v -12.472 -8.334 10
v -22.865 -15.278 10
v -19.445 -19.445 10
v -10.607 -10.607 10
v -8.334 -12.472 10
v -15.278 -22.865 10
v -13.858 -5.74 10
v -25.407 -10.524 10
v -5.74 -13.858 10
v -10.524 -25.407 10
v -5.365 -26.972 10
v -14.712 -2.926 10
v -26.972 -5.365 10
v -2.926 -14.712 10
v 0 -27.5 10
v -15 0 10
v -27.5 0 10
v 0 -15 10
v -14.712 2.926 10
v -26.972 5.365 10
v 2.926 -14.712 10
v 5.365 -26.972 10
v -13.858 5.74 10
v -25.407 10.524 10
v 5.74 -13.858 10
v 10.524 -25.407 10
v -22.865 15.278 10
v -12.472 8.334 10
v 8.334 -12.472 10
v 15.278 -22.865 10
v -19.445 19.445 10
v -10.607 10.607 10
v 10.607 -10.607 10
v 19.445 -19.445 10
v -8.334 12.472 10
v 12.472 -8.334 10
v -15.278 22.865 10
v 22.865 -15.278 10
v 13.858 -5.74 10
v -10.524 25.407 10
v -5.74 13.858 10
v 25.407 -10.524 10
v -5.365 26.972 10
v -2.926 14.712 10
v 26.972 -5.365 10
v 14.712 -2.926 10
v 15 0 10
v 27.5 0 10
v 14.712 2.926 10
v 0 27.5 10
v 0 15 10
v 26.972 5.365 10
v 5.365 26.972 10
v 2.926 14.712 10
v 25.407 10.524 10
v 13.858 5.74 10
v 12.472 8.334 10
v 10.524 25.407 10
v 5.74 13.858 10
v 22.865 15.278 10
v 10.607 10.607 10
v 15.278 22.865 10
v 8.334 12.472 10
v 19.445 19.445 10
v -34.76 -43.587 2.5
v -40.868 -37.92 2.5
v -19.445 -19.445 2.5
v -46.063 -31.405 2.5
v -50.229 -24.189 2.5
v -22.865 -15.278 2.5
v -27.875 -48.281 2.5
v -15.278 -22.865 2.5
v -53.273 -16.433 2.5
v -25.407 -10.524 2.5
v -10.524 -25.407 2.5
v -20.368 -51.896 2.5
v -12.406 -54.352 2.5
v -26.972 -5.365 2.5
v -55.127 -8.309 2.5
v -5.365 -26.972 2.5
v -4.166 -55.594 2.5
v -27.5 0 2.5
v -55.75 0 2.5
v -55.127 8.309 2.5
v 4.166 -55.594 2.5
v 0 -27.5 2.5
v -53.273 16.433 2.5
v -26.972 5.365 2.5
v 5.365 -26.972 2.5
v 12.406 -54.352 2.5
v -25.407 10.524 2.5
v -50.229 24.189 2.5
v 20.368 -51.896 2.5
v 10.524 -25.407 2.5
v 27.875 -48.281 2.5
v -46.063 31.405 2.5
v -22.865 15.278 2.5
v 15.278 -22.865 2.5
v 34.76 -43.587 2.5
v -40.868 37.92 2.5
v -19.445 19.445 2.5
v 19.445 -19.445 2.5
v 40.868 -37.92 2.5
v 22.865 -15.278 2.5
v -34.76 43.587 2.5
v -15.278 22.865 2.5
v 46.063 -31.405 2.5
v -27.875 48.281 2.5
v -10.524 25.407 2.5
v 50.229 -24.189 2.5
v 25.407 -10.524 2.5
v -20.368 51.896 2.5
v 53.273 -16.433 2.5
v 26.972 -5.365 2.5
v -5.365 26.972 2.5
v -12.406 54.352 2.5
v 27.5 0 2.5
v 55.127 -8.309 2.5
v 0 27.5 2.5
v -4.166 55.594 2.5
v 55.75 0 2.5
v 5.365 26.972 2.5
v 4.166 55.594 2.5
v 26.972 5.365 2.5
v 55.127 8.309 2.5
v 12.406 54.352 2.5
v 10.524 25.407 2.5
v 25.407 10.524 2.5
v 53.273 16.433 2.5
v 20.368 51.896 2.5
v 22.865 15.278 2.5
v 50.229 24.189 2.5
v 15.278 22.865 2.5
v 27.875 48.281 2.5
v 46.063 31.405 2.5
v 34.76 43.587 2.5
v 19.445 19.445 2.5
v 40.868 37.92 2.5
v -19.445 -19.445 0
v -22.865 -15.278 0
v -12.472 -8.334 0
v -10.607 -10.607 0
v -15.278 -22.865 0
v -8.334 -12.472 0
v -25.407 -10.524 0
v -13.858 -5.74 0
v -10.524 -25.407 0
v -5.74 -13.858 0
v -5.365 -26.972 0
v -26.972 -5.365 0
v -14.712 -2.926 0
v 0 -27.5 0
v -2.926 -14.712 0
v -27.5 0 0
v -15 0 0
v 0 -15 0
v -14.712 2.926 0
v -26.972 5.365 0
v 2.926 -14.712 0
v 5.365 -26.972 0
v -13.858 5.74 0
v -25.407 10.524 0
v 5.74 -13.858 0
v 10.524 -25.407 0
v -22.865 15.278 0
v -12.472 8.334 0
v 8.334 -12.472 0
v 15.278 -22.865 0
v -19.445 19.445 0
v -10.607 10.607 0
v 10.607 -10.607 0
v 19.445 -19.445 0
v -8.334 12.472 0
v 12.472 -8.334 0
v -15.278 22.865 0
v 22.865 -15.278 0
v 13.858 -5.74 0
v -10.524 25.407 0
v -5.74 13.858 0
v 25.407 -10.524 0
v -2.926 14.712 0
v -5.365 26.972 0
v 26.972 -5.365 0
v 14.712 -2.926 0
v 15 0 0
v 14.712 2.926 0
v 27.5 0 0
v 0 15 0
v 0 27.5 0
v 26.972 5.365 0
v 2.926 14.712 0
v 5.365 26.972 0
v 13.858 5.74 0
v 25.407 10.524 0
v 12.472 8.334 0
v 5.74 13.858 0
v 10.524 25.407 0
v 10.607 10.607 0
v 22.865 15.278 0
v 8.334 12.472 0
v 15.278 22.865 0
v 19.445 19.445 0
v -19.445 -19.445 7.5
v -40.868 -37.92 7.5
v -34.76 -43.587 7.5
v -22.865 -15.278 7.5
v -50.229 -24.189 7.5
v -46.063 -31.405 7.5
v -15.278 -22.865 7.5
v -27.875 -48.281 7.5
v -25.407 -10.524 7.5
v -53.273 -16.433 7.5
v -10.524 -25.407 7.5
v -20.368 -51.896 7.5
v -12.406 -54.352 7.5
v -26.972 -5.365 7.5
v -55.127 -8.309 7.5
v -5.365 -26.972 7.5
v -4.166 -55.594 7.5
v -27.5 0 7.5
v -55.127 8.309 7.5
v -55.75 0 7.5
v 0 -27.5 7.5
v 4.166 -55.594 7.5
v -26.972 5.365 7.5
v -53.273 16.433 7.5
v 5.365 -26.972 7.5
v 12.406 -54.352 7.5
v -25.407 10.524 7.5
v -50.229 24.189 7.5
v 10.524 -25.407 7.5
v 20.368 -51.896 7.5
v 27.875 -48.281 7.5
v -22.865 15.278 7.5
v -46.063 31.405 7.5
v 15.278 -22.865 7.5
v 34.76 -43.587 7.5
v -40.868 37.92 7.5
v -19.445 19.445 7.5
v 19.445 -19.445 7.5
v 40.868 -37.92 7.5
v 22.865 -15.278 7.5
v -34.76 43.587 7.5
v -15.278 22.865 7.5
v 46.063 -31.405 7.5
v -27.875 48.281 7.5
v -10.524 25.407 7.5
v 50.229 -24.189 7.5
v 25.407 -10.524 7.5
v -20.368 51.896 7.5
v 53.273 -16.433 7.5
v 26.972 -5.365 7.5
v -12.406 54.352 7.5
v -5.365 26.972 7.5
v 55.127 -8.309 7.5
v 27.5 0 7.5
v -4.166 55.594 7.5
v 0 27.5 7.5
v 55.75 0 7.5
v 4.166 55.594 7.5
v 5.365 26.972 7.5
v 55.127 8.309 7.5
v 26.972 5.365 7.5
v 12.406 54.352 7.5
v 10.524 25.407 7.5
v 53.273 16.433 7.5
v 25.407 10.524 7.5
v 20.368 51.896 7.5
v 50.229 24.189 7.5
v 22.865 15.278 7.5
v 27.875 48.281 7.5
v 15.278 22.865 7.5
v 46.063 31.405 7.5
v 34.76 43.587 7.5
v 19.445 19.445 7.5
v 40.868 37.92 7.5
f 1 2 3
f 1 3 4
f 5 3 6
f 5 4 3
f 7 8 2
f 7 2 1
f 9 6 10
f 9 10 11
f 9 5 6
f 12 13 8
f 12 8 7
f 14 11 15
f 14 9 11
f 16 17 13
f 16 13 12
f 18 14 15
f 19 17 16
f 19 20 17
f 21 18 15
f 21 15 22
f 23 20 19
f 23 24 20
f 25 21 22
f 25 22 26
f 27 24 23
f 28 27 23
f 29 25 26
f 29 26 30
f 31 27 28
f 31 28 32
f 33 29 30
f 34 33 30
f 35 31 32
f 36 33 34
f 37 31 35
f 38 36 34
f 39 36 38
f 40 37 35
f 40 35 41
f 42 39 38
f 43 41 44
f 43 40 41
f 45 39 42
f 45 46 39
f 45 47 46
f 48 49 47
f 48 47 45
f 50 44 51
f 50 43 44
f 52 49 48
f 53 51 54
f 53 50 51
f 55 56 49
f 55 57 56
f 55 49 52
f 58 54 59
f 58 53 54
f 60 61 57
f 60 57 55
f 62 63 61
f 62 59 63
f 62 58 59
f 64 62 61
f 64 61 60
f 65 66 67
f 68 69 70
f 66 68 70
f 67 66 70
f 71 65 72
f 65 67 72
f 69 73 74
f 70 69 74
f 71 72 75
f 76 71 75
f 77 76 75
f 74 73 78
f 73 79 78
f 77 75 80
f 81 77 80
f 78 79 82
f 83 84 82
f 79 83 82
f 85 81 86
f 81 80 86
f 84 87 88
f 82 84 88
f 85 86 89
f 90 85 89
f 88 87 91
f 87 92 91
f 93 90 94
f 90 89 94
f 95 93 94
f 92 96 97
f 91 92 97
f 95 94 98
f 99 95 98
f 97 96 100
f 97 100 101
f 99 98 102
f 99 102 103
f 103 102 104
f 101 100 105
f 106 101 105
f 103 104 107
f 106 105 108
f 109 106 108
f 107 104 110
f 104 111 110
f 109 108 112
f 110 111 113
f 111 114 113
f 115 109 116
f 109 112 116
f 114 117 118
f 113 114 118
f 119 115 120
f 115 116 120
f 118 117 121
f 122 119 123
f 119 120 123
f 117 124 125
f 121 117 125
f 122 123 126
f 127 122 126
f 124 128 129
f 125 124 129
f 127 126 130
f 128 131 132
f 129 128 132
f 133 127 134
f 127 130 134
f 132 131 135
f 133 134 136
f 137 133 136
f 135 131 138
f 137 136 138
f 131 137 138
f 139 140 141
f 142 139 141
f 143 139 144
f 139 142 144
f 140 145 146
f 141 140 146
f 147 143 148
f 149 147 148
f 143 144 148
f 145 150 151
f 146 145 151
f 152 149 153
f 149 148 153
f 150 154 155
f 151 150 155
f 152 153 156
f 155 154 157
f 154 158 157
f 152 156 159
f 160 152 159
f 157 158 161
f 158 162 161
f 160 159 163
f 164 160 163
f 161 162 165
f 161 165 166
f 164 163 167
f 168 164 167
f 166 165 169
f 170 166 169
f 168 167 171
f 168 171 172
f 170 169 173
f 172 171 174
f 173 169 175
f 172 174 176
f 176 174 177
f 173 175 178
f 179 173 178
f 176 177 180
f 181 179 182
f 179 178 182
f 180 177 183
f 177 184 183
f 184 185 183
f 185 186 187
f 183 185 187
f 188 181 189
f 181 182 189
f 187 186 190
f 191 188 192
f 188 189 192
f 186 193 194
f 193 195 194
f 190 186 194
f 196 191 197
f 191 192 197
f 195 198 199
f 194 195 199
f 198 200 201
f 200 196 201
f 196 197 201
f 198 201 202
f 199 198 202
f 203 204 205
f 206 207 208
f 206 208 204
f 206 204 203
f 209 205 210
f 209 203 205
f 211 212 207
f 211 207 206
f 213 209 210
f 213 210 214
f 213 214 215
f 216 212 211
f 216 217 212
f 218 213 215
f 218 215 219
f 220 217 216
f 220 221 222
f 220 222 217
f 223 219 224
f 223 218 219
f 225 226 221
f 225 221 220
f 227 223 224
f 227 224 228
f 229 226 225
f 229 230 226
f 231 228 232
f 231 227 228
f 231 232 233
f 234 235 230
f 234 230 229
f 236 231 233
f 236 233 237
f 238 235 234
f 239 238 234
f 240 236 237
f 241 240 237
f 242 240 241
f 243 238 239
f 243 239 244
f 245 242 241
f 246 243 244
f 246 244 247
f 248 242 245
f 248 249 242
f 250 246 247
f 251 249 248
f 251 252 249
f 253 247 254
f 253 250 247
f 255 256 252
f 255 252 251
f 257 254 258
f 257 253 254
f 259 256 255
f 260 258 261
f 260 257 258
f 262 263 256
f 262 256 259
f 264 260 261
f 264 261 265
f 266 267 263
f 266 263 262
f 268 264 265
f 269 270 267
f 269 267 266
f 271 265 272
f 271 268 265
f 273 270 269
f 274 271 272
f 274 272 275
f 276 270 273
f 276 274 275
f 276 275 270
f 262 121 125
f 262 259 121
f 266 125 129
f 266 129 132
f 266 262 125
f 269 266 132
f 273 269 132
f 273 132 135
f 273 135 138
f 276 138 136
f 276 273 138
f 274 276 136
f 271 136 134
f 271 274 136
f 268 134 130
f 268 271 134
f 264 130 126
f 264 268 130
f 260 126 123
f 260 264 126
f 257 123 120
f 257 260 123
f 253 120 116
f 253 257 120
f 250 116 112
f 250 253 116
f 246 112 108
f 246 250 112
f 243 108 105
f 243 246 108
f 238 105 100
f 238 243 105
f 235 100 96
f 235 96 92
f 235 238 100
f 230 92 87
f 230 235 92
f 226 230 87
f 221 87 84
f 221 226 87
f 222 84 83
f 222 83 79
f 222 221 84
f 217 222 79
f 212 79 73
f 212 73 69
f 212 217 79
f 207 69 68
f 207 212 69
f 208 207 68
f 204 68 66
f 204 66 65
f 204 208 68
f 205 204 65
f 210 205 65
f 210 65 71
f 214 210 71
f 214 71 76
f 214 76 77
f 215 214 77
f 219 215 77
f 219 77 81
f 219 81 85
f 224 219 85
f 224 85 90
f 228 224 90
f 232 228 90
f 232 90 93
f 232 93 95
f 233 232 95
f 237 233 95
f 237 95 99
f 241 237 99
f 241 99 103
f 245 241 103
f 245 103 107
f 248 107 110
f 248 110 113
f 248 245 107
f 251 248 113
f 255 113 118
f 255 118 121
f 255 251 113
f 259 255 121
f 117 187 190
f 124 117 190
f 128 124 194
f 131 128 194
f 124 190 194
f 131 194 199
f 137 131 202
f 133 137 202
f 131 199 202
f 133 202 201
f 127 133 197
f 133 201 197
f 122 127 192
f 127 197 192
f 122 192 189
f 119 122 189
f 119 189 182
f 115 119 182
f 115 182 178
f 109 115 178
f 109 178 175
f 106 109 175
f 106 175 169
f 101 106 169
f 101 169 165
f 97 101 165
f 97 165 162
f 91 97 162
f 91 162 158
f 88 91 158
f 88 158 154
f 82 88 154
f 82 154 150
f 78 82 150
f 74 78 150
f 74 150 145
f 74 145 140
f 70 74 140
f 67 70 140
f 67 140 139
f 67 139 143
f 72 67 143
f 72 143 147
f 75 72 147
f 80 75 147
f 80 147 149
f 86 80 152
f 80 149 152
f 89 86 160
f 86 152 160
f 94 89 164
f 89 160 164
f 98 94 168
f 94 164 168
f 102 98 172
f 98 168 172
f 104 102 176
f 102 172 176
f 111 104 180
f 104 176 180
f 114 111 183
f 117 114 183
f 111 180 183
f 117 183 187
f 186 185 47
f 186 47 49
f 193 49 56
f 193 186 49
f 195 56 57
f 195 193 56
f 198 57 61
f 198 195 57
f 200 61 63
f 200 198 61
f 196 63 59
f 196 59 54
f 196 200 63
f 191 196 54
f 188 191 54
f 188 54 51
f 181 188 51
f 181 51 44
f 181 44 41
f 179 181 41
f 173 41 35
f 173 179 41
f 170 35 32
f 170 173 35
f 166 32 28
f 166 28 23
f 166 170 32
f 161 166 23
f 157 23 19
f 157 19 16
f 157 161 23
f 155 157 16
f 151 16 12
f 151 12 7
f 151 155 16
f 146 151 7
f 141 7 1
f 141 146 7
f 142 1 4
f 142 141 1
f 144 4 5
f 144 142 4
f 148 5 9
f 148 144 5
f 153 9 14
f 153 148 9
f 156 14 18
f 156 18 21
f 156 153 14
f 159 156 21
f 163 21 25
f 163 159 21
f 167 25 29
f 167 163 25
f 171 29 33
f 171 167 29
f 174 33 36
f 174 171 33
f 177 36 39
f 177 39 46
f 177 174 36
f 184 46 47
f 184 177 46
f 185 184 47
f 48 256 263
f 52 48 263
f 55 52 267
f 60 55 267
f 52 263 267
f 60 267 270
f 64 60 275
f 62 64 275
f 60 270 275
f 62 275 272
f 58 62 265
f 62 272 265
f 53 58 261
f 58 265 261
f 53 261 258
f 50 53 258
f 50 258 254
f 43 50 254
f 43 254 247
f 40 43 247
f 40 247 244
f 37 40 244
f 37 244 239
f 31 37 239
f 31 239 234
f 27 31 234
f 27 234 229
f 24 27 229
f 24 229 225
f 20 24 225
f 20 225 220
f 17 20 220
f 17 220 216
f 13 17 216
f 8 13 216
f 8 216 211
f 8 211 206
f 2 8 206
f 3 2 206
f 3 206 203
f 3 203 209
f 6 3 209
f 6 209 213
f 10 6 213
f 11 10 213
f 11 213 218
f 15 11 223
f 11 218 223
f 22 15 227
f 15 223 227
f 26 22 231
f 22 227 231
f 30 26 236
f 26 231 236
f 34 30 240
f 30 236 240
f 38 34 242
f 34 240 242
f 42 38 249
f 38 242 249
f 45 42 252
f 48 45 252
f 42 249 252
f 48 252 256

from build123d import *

# Parameters (mm, degrees)
SKETCH1_R                = 27.5
SKETCH1_R_2              = 15
BOSS_EXTRUDE1_DEPTH      = 10
SKETCH2_R                = 55.75
SKETCH2_R_2              = 27.5
BOSS_EXTRUDE2_DEPTH      = 2.5
BOSS_EXTRUDE2_DEPTH_BACK = 2.5


with BuildPart() as part:
    # Sketch1 → Boss-Extrude1 (new body)
    with BuildSketch(Plane.XY):
        Circle(SKETCH1_R)
        Circle(SKETCH1_R_2, mode=Mode.SUBTRACT)
    extrude(amount=BOSS_EXTRUDE1_DEPTH)

    # Sketch2 → Boss-Extrude2 (add, two sides)
    with BuildSketch(Plane.XY.offset(5)) as boss_extrude2_sk:
        Circle(SKETCH2_R)
        Circle(SKETCH2_R_2, mode=Mode.SUBTRACT)
    extrude(amount=BOSS_EXTRUDE2_DEPTH)
    extrude(boss_extrude2_sk.sketch, amount=-BOSS_EXTRUDE2_DEPTH_BACK)


solid = part.part
